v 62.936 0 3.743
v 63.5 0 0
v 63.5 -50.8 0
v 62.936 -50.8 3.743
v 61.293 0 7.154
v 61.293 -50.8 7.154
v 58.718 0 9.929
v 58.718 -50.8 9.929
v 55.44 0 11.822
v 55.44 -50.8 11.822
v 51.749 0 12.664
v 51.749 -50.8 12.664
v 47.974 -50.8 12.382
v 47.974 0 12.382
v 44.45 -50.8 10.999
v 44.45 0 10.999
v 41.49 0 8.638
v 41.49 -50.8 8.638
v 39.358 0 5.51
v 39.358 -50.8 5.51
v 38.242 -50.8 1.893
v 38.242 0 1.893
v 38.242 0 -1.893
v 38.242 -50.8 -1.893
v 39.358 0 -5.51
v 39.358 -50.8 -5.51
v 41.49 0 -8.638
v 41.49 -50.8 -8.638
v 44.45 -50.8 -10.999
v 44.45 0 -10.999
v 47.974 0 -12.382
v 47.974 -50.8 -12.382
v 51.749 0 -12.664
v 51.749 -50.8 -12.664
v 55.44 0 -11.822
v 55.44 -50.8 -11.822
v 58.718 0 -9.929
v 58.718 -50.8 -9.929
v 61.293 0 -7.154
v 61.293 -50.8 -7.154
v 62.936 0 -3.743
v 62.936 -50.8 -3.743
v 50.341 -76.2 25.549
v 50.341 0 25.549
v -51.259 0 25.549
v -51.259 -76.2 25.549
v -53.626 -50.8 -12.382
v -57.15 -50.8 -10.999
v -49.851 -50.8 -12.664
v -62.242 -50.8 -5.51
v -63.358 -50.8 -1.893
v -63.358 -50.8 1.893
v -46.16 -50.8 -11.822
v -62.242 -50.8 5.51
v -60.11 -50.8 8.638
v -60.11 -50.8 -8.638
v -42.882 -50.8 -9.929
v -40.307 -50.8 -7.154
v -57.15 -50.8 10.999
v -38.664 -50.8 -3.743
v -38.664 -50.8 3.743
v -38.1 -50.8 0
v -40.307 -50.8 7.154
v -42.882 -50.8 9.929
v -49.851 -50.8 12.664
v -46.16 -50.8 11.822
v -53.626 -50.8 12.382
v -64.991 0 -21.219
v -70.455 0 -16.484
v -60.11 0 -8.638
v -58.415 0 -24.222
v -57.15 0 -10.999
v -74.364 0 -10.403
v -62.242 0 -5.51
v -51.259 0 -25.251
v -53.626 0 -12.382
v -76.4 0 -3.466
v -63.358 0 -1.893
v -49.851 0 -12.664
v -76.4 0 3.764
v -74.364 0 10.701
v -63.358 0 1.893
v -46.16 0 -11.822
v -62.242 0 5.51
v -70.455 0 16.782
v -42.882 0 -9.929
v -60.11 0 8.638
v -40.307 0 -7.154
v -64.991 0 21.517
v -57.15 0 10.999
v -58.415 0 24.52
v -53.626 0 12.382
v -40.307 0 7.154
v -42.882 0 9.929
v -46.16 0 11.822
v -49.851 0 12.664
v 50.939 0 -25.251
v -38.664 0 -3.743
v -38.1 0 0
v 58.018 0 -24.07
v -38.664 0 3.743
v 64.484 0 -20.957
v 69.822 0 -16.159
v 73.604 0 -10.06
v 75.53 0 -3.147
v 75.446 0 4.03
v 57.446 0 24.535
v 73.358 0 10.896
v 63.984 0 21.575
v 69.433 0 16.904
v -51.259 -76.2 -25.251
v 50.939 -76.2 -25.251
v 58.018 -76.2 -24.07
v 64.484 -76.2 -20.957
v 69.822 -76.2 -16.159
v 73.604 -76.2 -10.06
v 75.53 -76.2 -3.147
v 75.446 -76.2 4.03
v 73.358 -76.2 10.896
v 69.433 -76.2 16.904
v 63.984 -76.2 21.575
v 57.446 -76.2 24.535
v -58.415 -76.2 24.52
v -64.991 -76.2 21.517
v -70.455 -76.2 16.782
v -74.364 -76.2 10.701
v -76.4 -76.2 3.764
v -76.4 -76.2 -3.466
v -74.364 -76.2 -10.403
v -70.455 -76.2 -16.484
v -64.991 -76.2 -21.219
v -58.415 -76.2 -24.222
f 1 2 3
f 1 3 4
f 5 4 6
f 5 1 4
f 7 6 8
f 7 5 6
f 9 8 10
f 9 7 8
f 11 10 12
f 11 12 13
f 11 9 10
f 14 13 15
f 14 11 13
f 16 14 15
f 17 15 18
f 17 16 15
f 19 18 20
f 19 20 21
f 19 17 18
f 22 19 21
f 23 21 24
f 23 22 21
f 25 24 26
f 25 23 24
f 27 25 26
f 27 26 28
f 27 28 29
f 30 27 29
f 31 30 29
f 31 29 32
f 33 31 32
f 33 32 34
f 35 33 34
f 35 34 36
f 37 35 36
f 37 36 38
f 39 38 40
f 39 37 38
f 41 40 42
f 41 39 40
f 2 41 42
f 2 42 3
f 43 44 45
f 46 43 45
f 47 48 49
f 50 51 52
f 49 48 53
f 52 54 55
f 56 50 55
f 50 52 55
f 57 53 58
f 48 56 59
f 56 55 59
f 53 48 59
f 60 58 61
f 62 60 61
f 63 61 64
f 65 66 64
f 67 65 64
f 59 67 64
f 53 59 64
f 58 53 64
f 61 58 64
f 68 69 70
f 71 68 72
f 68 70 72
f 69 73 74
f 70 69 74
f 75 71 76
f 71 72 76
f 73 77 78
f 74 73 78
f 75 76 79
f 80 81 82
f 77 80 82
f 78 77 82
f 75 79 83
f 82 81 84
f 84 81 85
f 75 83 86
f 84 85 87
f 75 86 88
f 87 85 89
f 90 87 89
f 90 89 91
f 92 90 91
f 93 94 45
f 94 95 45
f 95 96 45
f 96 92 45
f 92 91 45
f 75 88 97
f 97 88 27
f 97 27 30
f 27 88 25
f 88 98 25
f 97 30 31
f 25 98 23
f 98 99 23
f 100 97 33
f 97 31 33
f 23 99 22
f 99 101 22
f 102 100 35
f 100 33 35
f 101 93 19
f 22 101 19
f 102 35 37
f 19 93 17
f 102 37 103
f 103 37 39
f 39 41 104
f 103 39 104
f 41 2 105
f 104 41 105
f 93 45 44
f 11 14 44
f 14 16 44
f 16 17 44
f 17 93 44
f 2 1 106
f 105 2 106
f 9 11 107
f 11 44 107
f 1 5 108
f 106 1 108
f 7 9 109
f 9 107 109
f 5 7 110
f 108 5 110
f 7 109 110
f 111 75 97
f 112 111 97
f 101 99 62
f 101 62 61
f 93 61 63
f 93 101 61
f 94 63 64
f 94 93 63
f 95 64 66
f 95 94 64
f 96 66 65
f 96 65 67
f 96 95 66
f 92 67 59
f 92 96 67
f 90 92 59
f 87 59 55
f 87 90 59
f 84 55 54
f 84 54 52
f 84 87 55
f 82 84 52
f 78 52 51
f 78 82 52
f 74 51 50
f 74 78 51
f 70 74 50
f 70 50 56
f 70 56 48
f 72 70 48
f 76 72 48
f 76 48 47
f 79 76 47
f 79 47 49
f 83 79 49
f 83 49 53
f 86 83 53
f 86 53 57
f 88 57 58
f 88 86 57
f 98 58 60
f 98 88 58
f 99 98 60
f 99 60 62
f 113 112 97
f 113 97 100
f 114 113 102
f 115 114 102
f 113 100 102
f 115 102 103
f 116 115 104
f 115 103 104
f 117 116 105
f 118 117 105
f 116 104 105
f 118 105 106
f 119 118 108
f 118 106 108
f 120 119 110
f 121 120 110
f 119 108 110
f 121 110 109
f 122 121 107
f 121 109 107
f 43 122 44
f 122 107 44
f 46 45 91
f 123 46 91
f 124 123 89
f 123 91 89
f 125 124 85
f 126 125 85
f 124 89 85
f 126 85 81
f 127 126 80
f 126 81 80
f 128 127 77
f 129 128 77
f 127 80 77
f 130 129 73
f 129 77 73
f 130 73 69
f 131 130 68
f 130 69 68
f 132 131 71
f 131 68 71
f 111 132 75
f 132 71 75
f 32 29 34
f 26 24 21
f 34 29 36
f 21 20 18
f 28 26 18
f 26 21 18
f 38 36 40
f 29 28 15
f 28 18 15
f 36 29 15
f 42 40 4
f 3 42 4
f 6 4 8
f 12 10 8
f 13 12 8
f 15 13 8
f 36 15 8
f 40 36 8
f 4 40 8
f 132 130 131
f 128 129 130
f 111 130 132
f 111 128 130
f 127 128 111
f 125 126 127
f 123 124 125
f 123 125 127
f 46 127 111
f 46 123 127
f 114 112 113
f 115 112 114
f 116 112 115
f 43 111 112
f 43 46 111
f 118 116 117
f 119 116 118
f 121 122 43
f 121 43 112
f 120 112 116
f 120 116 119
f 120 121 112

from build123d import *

# Parameters (mm, degrees)
F1_DEPTH = 76.2
F2_R     = 12.7
F3_DEPTH = 50.8


with BuildPart() as f1:
    # F0 (on Front) → F1 (new body)
    with BuildSketch(Plane.XZ):
        with BuildLine():
            Line((50.341128, 25.548994), (-51.258872, 25.548994))
            ThreePointArc((-51.258872, 25.548994), (-76.658872, 0.148994), (-51.258872, -25.251006))
            Line((-51.258872, -25.251006), (50.938825, -25.251006))
            ThreePointArc((50.938825, -25.251006), (75.742886, 0.444347), (50.341128, 25.548994))
        make_face()
    extrude(amount=F1_DEPTH)

    # F2 (on Front) → F3 (cut)
    with BuildSketch(Plane.XZ):
        with Locations((50.8, 0)):
            Circle(F2_R)
        with Locations((-50.8, 0)):
            Circle(F2_R)
    extrude(amount=F3_DEPTH, mode=Mode.SUBTRACT)


solid = f1.part
